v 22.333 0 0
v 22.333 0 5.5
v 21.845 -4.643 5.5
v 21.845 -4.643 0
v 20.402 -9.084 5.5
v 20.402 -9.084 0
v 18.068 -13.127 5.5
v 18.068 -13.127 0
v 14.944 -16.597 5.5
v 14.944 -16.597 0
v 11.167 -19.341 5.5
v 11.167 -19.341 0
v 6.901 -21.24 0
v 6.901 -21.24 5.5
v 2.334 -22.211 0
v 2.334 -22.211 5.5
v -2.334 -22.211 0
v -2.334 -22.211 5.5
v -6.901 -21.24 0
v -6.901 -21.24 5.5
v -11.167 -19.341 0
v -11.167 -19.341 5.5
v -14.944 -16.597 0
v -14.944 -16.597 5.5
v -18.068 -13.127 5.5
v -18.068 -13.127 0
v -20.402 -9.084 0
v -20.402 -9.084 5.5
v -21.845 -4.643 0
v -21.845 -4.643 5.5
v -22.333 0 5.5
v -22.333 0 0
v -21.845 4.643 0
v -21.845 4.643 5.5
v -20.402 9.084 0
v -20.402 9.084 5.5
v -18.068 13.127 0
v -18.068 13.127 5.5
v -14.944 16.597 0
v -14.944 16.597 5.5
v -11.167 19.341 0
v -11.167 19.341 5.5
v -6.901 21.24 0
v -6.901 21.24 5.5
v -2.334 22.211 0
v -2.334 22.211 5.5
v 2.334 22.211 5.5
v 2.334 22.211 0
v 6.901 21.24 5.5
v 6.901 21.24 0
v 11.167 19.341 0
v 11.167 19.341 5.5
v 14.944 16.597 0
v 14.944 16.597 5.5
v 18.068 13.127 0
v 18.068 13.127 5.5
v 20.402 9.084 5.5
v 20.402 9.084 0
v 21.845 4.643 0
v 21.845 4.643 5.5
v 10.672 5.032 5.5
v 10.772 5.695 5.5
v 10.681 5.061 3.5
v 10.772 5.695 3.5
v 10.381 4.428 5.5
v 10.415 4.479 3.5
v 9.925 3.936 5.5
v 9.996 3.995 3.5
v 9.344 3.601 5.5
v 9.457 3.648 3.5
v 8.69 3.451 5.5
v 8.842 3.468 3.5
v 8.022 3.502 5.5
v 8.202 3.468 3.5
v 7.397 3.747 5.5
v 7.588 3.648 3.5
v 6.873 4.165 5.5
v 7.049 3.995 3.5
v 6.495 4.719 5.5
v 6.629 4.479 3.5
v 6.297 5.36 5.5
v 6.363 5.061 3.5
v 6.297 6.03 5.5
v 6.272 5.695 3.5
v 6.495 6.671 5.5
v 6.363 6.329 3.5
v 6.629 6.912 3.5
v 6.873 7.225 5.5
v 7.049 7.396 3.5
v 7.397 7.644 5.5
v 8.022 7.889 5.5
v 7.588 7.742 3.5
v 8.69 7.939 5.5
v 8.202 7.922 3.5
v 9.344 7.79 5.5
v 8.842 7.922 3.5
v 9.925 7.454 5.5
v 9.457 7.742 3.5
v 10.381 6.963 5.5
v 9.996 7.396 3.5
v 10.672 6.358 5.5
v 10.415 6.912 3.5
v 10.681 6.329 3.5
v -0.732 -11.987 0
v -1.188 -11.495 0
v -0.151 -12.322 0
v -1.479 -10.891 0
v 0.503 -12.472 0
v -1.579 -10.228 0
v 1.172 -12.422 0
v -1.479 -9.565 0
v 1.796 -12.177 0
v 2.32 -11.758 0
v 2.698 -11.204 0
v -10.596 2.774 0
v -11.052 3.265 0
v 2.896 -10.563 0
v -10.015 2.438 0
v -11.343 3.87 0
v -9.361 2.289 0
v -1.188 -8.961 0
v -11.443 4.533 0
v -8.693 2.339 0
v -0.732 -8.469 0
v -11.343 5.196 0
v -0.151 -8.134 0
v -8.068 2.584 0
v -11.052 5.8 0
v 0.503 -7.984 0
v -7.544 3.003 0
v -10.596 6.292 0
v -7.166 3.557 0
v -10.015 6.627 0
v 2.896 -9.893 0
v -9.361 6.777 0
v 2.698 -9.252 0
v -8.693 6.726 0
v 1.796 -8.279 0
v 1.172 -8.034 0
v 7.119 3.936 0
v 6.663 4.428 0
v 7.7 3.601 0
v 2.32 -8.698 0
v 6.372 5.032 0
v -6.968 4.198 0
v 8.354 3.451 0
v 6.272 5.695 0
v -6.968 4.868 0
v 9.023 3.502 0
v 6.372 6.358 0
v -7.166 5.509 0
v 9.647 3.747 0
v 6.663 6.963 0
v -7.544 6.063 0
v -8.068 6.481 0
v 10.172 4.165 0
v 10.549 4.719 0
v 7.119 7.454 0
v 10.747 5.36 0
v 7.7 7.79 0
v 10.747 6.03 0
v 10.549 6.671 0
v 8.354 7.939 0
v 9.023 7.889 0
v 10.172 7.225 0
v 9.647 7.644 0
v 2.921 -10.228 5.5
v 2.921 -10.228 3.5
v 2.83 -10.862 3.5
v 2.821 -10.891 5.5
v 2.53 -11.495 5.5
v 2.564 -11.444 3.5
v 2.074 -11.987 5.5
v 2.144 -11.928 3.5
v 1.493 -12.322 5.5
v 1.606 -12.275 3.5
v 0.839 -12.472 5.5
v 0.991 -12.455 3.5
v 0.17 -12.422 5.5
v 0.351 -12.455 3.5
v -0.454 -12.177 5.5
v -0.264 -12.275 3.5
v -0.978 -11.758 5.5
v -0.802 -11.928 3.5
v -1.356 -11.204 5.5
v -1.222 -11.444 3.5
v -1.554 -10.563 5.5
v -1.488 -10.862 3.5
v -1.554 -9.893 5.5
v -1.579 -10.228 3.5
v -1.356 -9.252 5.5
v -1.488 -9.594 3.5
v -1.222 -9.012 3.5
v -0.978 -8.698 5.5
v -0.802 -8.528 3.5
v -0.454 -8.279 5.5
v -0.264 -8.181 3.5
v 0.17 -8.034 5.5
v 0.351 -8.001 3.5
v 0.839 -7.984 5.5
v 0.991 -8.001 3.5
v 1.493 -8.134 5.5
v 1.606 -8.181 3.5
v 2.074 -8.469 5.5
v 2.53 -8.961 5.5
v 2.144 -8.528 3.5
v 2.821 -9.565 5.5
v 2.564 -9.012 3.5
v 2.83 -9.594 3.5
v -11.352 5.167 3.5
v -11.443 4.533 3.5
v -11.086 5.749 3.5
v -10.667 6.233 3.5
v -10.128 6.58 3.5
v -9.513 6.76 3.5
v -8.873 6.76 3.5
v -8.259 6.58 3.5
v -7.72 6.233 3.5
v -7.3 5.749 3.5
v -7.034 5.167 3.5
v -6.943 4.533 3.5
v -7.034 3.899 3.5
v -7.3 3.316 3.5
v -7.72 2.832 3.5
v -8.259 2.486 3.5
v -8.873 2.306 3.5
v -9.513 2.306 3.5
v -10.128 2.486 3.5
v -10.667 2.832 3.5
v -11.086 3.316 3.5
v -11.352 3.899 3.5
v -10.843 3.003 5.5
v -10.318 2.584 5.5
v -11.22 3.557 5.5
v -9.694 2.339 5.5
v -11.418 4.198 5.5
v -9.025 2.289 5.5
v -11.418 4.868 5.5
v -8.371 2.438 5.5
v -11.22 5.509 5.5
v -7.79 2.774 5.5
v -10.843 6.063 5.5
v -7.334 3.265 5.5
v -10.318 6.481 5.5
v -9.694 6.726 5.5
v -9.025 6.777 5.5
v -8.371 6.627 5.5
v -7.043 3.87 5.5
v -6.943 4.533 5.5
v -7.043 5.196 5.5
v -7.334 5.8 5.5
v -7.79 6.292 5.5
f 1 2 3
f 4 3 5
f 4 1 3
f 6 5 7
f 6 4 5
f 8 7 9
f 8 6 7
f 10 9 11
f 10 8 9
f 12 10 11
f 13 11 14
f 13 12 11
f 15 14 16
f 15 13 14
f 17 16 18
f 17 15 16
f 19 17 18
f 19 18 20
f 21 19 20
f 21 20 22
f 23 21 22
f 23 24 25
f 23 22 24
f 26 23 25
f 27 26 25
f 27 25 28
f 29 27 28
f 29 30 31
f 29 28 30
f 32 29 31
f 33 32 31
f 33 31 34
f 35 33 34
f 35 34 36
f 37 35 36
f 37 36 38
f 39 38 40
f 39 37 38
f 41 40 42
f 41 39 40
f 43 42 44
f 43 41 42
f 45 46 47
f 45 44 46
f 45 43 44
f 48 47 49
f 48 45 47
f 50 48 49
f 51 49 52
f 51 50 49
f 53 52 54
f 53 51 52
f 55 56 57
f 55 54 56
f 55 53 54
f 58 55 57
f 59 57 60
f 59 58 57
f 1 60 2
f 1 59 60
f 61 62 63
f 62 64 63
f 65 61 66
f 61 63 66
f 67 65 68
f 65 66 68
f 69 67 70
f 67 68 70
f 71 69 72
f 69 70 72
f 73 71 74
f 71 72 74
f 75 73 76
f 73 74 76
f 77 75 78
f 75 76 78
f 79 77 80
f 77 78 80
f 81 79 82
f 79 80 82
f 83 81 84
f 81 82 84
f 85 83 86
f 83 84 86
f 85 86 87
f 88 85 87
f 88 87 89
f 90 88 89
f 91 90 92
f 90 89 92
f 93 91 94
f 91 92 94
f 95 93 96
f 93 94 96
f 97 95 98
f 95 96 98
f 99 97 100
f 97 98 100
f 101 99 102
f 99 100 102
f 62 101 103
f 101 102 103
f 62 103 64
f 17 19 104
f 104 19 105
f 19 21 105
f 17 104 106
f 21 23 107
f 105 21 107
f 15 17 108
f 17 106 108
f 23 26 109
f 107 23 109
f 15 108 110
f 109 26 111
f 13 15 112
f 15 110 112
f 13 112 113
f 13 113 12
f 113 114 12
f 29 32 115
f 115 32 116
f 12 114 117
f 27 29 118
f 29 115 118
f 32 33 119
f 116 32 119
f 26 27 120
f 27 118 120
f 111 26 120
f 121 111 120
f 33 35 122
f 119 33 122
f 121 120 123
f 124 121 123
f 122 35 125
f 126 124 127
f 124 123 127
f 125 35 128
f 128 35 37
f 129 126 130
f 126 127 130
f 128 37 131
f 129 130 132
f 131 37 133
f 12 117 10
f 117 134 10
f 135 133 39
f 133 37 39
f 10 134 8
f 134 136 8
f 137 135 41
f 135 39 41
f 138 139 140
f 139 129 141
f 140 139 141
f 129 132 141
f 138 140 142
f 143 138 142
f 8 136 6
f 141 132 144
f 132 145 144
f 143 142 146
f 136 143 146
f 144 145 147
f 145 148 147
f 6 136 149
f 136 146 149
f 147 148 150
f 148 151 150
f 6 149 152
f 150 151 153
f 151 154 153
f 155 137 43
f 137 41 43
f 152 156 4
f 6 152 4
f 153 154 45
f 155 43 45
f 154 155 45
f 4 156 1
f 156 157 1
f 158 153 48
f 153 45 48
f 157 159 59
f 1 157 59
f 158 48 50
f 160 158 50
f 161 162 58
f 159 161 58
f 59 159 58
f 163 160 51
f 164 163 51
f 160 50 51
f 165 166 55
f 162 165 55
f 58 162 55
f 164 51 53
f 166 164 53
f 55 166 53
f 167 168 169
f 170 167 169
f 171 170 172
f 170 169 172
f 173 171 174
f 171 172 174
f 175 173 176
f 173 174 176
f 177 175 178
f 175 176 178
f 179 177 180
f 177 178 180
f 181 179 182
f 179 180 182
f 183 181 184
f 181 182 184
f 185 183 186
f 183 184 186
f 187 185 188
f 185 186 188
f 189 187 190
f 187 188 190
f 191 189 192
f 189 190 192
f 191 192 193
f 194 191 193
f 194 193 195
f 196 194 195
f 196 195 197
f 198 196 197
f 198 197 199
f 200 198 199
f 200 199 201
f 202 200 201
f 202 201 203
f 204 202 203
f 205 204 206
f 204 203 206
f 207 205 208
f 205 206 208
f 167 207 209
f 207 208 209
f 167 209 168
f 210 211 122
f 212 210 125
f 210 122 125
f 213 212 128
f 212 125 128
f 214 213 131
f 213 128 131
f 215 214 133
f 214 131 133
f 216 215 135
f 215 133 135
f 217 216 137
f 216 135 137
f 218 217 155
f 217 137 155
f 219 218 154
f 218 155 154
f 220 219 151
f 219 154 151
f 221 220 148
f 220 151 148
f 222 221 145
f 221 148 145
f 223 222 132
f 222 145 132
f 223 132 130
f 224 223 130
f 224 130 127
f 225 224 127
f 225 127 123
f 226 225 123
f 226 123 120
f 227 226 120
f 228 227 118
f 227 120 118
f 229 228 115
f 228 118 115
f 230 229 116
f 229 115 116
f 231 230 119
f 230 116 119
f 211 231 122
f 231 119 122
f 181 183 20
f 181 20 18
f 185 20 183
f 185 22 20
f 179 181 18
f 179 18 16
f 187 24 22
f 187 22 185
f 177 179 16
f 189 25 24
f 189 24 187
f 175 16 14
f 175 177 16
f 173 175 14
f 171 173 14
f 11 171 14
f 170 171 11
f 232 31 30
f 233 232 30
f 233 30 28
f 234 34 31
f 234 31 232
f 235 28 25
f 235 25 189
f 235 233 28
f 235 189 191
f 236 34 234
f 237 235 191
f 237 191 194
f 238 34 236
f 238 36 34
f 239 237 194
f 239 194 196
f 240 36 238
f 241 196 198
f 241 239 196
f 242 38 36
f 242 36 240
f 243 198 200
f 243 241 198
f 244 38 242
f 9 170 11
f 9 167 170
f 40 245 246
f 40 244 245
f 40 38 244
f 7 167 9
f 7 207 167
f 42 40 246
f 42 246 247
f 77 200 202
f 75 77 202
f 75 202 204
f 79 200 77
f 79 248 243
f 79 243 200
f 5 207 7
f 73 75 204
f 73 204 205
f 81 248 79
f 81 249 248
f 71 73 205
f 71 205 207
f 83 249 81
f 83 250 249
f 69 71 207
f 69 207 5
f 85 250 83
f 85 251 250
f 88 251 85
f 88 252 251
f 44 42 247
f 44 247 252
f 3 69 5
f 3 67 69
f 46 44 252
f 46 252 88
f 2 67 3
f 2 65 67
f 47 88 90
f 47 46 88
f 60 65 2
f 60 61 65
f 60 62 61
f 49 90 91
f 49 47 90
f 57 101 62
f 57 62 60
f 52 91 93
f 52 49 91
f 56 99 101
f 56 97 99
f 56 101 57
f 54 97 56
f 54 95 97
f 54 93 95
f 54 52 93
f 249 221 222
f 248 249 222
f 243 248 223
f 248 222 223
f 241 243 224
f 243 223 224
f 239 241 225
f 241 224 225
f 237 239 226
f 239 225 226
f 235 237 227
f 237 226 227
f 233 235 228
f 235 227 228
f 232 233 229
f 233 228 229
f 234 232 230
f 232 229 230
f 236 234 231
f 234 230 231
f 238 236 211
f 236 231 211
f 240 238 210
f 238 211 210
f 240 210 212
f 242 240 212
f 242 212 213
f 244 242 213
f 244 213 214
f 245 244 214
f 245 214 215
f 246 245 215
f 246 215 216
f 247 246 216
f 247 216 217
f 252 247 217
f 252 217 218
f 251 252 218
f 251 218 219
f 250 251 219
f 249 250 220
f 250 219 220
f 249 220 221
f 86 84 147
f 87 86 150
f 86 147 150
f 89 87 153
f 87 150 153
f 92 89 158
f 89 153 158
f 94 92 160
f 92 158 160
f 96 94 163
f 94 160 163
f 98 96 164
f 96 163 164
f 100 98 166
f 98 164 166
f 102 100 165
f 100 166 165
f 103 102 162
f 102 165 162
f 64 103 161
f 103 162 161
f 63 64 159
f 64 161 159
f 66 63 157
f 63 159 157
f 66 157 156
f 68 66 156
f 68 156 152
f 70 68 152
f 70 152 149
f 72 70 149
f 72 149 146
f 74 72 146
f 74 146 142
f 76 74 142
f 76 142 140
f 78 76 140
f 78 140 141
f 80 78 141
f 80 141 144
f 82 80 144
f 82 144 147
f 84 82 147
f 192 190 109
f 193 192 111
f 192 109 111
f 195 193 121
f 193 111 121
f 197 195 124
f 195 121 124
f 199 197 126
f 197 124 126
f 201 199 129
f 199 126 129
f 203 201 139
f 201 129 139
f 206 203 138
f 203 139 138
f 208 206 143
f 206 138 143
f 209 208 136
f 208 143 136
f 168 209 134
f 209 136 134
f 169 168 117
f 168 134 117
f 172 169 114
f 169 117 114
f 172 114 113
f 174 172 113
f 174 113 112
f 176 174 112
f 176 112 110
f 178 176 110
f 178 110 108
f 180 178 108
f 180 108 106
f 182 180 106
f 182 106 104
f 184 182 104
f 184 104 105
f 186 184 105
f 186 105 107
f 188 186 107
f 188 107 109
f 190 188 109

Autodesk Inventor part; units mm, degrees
ref_plane "YZ Plane" through (0, 0, 0) normal (1, 0, 0) x (0, 1, 0)
ref_plane "XZ Plane" through (0, 0, 0) normal (0, 1, 0) x (-1, 0, 0)
ref_plane "XY Plane" through (0, 0, 0) normal (0, 0, 1) x (1, 0, 0)
sketch "Sketch1" plane through (0, 0, 0) normal (0, 0, 1) x (1, 0, 0)
  circle A0 centre (-0.671, 10.228) radius 3.5 projected
  circle A1 centre (-8.5222, -5.6951) radius 3.5 projected
  circle A2 centre (9.1932, -4.5329) radius 3.5 projected
  circle A3 centre (0, 0) radius 15 projected
  circle A4 centre (8.5222, 5.6951) radius 2 projected
  circle A5 centre (0.671, -10.228) radius 2 projected
  circle A6 centre (-9.1932, 4.5329) radius 2 projected
  circle A7 centre (20.0905, -24.1532) radius 3.75 projected
  circle A8 centre (-30.4505, 7.7314) radius 3.75 projected
  circle A9 centre (-2.0567, 31.3493) radius 3.75 projected
  circle A10 centre (-16.7628, -26.571) radius 3.75 projected
  circle A11 centre (29.1794, 11.6435) radius 3.75 projected
  circle A12 centre (0, 0) radius 23.3333 projected
  arc A13 (-39.4862, -1.0454) -> (-35.737, -7.6127) centre (-31.489, -0.8337) ccw projected
  arc A14 (-34.2512, -12.7254) -> (-35.737, -7.6127) centre (-37.861, -11.0021) ccw projected
  arc A15 (-34.2512, -12.7254) -> (-33.8969, -20.2792) centre (-27.0317, -16.172) ccw projected
  arc A16 (-33.8969, -20.2792) -> (36.2558, -15.6768) centre (0, 0) ccw projected
  arc A17 (36.2558, -15.6768) -> (35.6202, -8.1415) centre (28.9129, -12.5018) ccw projected
  arc A18 (36.4252, -2.8784) -> (35.6202, -8.1415) centre (38.9739, -5.9614) ccw projected
  arc A19 (36.4252, -2.8784) -> (39.2843, 4.1223) centre (31.328, 3.2874) ccw projected
  arc A20 (39.2843, 4.1223) -> (-39.4862, -1.0454) centre (0, 0) ccw projected
  line L0 (0, 23.3333) -> (0, 22.3333)
  circle A21 centre (0, 0) radius 22.3333
  point P0 (0, 0)
  dimension "d0" = 1
extrude "Extrusion1" add sketch "Sketch1" along normal blind 3.5 contours A0 | A1 | A2 | A3 | A21
sketch "Sketch2" plane through (0, 0, 0) normal (0, 0, -1) x (-1, 0, 0)
  circle A0 centre (0, 0) radius 22.3333 projected
  circle A1 centre (-8.5222, 5.6951) radius 2 projected
  circle A2 centre (-0.671, -10.228) radius 2 projected
  circle A3 centre (9.1932, 4.5329) radius 2 projected
  circle A4 centre (-8.5222, 5.6951) radius 2.25
  circle A5 centre (9.1932, 4.5329) radius 2.25
  circle A6 centre (-0.671, -10.228) radius 2 projected
  circle A7 centre (-0.671, -10.228) radius 2.25
  point P0 (0, 0)
  dimension "d3" = 4.5
  dimension "d4" = 4.5
  dimension "d5" = 4.5
extrude "Extrusion2" cut sketch "Sketch2" against normal through all contours A1 | A2 | A3 | A4 | A5 | A7
sketch "Szkic3" plane through (0, 0, 3.5) normal (0, 0, 1) x (1, 0, 0)
  circle A0 centre (0.671, -10.228) radius 2.25 projected
  circle A1 centre (-9.1932, 4.5329) radius 2.25 projected
  circle A2 centre (8.5222, 5.6951) radius 2.25 projected
  circle A3 centre (0, 0) radius 22.3333 projected
  point P0 (0, 0)
extrude "Wyciągnięcie proste3" add sketch "Szkic3" along normal blind 2
properties part number "kółko"
